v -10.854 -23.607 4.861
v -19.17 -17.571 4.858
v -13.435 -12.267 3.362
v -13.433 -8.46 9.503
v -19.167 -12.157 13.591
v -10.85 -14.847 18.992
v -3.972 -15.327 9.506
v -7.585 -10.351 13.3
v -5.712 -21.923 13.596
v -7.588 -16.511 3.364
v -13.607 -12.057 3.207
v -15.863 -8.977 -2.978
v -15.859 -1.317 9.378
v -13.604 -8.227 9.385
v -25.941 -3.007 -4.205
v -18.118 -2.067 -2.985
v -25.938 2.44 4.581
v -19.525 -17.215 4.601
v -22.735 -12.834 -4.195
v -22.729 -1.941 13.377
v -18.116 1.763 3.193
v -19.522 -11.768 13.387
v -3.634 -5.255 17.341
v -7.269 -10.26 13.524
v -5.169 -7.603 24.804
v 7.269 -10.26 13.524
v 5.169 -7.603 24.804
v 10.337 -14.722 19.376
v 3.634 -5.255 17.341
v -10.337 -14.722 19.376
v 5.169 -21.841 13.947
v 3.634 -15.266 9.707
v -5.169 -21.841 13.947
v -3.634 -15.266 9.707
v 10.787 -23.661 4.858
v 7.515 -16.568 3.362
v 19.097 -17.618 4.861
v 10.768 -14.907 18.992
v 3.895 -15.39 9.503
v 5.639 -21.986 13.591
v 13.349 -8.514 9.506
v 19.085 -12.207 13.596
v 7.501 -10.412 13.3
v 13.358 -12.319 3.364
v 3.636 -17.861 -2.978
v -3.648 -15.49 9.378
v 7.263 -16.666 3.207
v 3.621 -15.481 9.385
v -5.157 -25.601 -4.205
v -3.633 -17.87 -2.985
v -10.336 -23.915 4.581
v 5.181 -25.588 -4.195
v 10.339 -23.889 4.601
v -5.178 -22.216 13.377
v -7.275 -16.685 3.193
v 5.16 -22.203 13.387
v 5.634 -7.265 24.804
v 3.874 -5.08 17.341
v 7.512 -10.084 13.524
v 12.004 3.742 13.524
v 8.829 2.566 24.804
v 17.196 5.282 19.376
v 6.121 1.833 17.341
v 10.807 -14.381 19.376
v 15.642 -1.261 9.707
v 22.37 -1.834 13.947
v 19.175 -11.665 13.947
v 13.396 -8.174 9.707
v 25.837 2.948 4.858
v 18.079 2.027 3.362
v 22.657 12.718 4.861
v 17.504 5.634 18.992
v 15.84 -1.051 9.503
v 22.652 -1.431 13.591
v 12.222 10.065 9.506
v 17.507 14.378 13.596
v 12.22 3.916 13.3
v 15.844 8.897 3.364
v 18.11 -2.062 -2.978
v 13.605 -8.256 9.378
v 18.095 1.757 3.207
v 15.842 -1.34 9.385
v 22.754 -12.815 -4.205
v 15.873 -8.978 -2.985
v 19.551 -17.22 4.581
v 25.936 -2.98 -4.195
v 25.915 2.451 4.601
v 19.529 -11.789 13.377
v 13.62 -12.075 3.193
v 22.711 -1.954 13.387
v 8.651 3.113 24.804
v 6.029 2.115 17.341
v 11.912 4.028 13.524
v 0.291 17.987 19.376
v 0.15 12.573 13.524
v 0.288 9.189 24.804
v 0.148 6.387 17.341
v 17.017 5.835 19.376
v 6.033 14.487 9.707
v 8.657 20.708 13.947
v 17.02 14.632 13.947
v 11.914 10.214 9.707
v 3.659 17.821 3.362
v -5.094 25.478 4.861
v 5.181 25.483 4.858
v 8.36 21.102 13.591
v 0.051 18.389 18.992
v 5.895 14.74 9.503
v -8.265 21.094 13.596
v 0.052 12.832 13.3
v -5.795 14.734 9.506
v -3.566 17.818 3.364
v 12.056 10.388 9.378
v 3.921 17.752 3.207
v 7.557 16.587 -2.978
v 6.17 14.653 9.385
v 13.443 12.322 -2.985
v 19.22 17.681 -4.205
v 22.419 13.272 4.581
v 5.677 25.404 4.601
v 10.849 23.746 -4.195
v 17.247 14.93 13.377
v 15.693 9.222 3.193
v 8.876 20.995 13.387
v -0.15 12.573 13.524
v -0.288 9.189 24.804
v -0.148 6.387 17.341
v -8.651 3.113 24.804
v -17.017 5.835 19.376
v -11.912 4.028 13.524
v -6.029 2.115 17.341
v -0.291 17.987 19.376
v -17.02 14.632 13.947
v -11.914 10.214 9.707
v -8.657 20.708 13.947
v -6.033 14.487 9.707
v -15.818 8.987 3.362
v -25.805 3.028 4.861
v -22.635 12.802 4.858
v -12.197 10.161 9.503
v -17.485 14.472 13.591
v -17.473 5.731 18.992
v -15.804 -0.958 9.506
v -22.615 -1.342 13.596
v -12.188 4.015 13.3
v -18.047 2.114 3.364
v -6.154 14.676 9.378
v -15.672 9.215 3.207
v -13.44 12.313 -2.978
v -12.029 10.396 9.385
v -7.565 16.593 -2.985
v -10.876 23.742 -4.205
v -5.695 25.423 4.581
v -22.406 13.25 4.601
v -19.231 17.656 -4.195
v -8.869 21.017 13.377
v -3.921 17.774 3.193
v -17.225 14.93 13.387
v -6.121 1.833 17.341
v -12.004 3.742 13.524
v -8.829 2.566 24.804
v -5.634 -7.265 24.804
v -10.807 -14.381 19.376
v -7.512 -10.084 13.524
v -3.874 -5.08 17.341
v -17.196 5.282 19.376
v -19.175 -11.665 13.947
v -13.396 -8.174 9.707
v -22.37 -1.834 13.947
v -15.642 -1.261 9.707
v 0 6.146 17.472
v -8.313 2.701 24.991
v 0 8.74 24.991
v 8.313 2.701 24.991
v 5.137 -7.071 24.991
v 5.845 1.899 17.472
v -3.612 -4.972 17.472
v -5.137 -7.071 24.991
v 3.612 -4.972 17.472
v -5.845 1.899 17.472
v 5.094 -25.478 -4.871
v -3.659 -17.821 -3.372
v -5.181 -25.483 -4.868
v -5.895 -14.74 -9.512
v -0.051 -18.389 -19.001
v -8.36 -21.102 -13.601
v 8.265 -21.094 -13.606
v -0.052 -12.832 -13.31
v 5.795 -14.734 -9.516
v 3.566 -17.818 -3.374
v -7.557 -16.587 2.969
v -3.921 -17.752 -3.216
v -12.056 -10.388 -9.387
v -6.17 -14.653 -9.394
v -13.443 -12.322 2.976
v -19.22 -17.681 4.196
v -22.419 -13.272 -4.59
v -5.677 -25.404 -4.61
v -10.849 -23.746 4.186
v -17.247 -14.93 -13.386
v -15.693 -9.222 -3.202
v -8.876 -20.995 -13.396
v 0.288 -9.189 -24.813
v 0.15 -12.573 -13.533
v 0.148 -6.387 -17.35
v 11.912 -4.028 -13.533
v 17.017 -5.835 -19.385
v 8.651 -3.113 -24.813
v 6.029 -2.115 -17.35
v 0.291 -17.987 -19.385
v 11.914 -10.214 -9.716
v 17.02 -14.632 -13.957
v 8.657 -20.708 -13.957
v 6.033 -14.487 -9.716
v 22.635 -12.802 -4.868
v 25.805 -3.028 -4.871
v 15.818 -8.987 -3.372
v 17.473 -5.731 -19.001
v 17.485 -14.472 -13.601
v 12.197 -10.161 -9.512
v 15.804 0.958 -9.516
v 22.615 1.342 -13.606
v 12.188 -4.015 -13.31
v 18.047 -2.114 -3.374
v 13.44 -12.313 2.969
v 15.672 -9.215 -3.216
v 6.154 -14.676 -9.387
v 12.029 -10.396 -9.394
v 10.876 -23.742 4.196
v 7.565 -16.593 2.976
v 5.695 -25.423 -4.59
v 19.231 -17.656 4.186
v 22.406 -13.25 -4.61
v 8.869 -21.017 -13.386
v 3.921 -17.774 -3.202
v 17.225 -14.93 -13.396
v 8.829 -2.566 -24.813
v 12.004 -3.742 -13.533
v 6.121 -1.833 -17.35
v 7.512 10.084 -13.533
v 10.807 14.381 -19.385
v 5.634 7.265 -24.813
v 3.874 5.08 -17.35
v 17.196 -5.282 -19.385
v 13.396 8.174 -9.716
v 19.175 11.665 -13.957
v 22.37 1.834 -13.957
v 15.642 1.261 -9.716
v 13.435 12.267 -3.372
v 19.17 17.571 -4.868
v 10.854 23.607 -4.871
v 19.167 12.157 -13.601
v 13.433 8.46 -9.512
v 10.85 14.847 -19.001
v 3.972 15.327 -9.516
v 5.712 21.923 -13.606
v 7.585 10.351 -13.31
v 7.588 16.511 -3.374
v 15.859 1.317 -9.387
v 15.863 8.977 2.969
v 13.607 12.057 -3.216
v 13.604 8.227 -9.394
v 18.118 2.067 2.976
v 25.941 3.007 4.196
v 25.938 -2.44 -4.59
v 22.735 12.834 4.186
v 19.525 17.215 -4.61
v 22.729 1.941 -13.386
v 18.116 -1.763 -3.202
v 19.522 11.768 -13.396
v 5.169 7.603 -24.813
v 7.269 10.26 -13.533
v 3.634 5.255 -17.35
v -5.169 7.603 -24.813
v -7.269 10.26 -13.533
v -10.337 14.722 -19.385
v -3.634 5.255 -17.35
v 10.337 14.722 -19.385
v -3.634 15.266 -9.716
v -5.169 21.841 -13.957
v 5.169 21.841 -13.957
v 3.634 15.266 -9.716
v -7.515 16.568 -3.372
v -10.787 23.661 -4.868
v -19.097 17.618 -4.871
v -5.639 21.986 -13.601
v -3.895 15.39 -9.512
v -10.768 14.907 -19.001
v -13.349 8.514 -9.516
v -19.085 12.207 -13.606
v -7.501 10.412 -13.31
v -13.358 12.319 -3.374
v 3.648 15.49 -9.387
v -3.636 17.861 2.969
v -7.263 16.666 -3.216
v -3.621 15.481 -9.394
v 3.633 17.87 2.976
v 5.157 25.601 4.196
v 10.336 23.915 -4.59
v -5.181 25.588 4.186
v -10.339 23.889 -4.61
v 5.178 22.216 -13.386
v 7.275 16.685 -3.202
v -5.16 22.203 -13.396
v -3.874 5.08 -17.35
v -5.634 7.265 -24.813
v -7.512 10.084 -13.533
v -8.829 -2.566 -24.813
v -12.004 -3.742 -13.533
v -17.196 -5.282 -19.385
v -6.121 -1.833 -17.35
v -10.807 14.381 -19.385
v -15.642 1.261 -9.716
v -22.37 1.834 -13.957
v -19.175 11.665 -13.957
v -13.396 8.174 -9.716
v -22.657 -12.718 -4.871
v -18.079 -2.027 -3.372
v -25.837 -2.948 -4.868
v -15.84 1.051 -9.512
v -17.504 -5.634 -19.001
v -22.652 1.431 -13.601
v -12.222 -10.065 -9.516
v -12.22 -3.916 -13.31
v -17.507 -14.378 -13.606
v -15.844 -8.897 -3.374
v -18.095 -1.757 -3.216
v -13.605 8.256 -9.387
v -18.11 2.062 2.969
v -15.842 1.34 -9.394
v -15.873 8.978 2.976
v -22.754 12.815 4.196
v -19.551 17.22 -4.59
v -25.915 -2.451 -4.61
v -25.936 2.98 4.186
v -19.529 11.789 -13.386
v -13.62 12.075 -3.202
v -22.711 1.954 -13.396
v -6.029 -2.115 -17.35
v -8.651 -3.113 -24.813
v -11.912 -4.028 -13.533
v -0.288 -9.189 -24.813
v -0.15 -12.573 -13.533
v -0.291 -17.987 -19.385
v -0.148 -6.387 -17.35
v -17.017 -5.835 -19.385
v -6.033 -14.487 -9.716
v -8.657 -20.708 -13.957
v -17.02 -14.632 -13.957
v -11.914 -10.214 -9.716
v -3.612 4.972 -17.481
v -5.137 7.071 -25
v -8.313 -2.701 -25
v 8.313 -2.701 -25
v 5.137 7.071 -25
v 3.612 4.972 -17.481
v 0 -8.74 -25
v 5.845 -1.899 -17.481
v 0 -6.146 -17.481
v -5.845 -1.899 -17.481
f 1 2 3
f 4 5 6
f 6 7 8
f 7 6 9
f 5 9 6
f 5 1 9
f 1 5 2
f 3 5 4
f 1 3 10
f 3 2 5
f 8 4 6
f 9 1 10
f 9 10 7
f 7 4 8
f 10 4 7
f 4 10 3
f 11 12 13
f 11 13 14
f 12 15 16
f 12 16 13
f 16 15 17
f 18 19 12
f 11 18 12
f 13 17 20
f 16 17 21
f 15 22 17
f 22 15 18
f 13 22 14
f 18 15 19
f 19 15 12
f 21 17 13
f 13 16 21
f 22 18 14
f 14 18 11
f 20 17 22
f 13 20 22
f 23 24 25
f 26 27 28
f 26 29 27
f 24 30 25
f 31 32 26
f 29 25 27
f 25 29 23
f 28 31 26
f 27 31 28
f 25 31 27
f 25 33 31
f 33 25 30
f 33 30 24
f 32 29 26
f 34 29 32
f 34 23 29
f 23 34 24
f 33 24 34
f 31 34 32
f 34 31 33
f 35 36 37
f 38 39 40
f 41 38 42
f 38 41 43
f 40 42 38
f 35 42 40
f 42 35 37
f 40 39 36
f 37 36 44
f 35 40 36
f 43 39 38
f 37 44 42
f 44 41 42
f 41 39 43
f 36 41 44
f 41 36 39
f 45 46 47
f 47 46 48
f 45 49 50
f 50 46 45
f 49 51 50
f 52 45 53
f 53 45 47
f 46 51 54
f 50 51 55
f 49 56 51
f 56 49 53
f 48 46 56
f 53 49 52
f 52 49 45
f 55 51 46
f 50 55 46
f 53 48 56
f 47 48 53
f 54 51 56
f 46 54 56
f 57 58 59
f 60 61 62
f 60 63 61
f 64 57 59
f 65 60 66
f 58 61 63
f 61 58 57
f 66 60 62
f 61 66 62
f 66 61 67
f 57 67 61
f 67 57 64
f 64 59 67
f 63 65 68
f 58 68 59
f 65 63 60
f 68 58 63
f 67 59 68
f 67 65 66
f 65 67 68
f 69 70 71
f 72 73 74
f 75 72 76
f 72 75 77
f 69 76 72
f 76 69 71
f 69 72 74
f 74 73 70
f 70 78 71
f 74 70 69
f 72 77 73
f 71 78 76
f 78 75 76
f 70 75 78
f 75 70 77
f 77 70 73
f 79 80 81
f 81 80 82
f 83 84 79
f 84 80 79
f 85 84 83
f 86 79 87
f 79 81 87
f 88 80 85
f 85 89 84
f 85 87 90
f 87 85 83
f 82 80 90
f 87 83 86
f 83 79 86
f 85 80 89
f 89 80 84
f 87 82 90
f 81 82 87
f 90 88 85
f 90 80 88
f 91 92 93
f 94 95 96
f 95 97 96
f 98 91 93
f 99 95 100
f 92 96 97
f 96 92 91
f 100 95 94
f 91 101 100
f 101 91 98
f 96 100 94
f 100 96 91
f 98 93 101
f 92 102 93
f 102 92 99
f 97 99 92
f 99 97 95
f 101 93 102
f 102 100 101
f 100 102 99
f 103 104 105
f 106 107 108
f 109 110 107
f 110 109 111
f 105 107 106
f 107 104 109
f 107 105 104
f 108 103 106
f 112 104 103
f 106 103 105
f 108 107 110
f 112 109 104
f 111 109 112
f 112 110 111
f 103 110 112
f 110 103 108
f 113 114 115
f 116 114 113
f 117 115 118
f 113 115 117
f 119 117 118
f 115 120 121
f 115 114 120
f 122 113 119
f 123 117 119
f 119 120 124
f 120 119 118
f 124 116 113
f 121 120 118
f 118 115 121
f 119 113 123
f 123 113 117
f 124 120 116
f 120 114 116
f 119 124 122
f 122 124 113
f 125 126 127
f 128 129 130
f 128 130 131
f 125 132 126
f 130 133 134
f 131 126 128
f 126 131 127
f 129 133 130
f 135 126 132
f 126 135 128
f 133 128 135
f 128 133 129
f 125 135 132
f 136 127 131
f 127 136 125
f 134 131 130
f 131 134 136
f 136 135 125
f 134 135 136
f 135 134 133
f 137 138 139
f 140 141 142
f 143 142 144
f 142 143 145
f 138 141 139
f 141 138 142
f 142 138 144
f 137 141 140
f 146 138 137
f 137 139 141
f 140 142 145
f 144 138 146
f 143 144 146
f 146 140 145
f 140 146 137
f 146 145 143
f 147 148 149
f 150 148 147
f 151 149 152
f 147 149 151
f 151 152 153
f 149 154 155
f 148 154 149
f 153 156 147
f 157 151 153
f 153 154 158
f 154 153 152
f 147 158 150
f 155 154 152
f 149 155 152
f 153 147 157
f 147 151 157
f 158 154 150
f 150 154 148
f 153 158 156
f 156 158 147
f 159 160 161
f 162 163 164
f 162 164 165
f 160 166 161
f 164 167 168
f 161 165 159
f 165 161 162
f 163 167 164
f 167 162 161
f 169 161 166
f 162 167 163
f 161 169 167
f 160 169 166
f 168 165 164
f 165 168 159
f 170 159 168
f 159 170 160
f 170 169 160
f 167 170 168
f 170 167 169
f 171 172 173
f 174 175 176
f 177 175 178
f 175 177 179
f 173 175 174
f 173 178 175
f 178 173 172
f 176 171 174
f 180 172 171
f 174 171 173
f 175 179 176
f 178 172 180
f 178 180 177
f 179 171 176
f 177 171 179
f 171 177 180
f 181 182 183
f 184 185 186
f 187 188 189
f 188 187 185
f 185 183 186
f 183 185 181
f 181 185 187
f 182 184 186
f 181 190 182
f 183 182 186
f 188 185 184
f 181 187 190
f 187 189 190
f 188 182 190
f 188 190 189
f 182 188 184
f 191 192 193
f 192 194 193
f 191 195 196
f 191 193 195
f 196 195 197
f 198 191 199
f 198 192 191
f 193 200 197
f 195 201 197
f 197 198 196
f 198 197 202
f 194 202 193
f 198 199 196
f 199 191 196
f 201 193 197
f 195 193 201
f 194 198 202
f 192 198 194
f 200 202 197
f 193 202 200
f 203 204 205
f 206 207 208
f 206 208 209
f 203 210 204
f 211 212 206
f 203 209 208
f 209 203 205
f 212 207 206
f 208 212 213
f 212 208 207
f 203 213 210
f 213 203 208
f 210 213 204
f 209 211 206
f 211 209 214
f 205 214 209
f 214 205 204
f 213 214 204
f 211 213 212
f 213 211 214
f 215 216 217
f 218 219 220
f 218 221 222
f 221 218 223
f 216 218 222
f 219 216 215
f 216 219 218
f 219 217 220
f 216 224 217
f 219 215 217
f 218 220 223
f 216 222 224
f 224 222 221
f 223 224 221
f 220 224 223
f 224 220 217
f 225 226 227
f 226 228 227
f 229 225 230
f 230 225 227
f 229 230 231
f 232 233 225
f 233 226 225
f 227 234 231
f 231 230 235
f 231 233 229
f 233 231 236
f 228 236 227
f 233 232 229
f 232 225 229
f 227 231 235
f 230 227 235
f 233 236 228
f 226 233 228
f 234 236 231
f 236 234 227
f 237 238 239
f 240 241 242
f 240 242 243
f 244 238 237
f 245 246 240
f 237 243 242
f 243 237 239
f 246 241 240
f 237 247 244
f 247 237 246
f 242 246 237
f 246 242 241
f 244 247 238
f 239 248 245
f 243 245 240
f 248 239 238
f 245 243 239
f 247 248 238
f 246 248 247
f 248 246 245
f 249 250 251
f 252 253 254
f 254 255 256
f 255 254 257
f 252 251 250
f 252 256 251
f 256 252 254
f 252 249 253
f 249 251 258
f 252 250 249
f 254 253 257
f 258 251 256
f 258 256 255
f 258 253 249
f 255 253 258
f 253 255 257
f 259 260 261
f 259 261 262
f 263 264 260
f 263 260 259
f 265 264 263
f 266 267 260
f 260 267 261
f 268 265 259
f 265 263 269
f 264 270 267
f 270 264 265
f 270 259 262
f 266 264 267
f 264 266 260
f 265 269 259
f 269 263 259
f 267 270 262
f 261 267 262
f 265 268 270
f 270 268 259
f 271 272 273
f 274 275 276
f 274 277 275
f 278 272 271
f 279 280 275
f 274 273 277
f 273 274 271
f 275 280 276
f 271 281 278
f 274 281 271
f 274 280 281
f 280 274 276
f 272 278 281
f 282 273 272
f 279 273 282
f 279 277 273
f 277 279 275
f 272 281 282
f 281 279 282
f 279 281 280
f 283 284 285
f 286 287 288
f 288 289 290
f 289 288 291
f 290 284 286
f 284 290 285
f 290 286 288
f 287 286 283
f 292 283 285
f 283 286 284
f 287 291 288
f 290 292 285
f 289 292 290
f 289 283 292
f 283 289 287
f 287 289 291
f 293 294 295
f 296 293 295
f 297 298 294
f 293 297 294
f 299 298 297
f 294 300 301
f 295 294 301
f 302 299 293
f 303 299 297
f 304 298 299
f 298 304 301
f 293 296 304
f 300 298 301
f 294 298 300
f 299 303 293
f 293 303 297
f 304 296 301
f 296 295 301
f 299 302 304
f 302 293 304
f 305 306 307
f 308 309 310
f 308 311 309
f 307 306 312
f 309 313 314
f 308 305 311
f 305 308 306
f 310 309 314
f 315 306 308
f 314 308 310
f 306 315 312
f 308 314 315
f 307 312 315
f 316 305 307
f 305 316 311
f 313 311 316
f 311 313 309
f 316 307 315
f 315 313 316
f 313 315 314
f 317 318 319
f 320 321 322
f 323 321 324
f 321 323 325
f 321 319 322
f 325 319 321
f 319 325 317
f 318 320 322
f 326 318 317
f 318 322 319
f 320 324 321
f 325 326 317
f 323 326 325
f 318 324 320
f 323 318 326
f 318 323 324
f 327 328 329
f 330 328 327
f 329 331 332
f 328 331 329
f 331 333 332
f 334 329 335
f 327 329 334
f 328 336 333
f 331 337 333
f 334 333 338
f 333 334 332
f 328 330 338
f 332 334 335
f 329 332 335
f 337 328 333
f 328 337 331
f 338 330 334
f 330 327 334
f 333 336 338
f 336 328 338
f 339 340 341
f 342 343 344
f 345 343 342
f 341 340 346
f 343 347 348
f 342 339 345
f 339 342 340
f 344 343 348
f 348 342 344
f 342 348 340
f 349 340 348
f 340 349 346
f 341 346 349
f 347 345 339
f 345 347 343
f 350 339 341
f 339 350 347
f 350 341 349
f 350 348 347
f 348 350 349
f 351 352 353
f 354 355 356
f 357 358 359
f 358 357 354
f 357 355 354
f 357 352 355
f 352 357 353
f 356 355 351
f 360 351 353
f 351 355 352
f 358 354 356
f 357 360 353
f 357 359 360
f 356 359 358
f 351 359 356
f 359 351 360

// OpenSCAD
height = 50; 
spacing = 0.5;

// create a pentagon by length.
// Parameters:
//     length : the side length
//     spacing : the gap between a pentagon or a hexagon
module pentagon(length, spacing = 0.5) {
    r = 0.5 * length / sin(36);
	s = (r - spacing / 2) / r;

    color("black") 
	    rotate(18) 		     
		     linear_extrude(length, scale = 1.42215)
		        scale([s, s, s])
			        circle(0.5 * length / sin(36), $fn = 5);
}

// create a hexagon by length.
// Parameters:
//     length : the side length
//     spacing : the gap between a pentagon or a hexagon
module hexagon(length, spacing = 0.5) {
    r = 0.5 * length / sin(30);
	s = (r - spacing / 2) / r;

    color("white") 
	     linear_extrude(length - length * 0.02125, scale = 1.42215) 
		    scale([s, s, s])			
		        circle(0.5 * length / sin(30), $fn = 6);
}

// one pentagons and two hexagons.
// Parameters:
//     length : the side length
//     spacing : the gap between the pentagon and hexagon
module pentagon_based_sub_comp(length, spacing = 0.5) {
	pentagon_circle_r = 0.5 * length / sin(36);
	
	a = 37.325;
	
	offset_y = 0.5 * length * tan(54) + pentagon_circle_r * cos(a);
	offset_z = 0.5 * length * tan(60) * sin(a);
	
	translate([0, -offset_y, -offset_z]) 
	    rotate([a, 0, 0]) 
		    hexagon_based_sub_comp(length, spacing);
}


// two hexagons and one pentagon.
// Parameters:
//     length : the side length
//     spacing : the gap between the pentagon and hexagon
module hexagon_based_sub_comp(length, spacing = 0.5) {
    hexagon(length, spacing);
	
	length_center_to_side = 0.5 * length * tan(54);
	
    a = -37.325;
	
	offset_y = 0.5 * length * (tan(54) * cos(a) + tan(60));
	offset_z = length_center_to_side * sin(a);
	
	rotate(120) translate([0, offset_y, offset_z]) 
	    rotate([a, 0, 0]) 
	        pentagon_hexagon(length, spacing);
			
}

// a pentagon and a hexagon.
// Parameters:
//     length : the side length
//     spacing : the gap between the pentagon and hexagon
module pentagon_hexagon(length, spacing = 0.5) {
	pentagon_circle_r = 0.5 * length / sin(36);
	
	pentagon(length, spacing);
	
	a = 37.325;
	
	offset_y = 0.5 * length * tan(54) + pentagon_circle_r * cos(a);
	offset_z = 0.5 * length * tan(60) * sin(a);
	
	rotate(144) translate([0, -offset_y, -offset_z]) 
	    rotate([a, 0, 0]) 
		    hexagon(length, spacing);
}

// a half of soccer polyhedron.
// Parameters:
//     line_length : the side length of pentagons and hexagons
//     spacing : the gap between the pentagon and hexagon
module half_soccer_polyhedron(line_length, spacing = 0.5) {
	pentagon_circle_r = 0.5 * line_length / sin(36);
	offset_y = pentagon_circle_r * cos(36);

	pentagon(line_length, spacing);
	
	for(i = [0:4]) {
		rotate(72 * i) 
		    pentagon_based_sub_comp(line_length, spacing);
	}
}

// a soccer polyhedron.
// Parameters:
//     line_length : the side length of pentagons and hexagons
//     spacing : the gap between the pentagon and hexagon
//     center : center it or not
module soccer_polyhedron(height, spacing = 0.5, center = true) {
    line_length = height / 6.65;
	
	offset_for_center = center ? height / 2: 0;
	
	translate([0, 0, -offset_for_center]) union() {
		translate([0, 0, -line_length + line_length * 6.64875]) 
		    half_soccer_polyhedron(line_length, spacing);
			
		rotate(36) mirror([0, 0, 1]) translate([0, 0, -line_length]) 
		    half_soccer_polyhedron(line_length, spacing);
	}
}

soccer_polyhedron(height, spacing); 
